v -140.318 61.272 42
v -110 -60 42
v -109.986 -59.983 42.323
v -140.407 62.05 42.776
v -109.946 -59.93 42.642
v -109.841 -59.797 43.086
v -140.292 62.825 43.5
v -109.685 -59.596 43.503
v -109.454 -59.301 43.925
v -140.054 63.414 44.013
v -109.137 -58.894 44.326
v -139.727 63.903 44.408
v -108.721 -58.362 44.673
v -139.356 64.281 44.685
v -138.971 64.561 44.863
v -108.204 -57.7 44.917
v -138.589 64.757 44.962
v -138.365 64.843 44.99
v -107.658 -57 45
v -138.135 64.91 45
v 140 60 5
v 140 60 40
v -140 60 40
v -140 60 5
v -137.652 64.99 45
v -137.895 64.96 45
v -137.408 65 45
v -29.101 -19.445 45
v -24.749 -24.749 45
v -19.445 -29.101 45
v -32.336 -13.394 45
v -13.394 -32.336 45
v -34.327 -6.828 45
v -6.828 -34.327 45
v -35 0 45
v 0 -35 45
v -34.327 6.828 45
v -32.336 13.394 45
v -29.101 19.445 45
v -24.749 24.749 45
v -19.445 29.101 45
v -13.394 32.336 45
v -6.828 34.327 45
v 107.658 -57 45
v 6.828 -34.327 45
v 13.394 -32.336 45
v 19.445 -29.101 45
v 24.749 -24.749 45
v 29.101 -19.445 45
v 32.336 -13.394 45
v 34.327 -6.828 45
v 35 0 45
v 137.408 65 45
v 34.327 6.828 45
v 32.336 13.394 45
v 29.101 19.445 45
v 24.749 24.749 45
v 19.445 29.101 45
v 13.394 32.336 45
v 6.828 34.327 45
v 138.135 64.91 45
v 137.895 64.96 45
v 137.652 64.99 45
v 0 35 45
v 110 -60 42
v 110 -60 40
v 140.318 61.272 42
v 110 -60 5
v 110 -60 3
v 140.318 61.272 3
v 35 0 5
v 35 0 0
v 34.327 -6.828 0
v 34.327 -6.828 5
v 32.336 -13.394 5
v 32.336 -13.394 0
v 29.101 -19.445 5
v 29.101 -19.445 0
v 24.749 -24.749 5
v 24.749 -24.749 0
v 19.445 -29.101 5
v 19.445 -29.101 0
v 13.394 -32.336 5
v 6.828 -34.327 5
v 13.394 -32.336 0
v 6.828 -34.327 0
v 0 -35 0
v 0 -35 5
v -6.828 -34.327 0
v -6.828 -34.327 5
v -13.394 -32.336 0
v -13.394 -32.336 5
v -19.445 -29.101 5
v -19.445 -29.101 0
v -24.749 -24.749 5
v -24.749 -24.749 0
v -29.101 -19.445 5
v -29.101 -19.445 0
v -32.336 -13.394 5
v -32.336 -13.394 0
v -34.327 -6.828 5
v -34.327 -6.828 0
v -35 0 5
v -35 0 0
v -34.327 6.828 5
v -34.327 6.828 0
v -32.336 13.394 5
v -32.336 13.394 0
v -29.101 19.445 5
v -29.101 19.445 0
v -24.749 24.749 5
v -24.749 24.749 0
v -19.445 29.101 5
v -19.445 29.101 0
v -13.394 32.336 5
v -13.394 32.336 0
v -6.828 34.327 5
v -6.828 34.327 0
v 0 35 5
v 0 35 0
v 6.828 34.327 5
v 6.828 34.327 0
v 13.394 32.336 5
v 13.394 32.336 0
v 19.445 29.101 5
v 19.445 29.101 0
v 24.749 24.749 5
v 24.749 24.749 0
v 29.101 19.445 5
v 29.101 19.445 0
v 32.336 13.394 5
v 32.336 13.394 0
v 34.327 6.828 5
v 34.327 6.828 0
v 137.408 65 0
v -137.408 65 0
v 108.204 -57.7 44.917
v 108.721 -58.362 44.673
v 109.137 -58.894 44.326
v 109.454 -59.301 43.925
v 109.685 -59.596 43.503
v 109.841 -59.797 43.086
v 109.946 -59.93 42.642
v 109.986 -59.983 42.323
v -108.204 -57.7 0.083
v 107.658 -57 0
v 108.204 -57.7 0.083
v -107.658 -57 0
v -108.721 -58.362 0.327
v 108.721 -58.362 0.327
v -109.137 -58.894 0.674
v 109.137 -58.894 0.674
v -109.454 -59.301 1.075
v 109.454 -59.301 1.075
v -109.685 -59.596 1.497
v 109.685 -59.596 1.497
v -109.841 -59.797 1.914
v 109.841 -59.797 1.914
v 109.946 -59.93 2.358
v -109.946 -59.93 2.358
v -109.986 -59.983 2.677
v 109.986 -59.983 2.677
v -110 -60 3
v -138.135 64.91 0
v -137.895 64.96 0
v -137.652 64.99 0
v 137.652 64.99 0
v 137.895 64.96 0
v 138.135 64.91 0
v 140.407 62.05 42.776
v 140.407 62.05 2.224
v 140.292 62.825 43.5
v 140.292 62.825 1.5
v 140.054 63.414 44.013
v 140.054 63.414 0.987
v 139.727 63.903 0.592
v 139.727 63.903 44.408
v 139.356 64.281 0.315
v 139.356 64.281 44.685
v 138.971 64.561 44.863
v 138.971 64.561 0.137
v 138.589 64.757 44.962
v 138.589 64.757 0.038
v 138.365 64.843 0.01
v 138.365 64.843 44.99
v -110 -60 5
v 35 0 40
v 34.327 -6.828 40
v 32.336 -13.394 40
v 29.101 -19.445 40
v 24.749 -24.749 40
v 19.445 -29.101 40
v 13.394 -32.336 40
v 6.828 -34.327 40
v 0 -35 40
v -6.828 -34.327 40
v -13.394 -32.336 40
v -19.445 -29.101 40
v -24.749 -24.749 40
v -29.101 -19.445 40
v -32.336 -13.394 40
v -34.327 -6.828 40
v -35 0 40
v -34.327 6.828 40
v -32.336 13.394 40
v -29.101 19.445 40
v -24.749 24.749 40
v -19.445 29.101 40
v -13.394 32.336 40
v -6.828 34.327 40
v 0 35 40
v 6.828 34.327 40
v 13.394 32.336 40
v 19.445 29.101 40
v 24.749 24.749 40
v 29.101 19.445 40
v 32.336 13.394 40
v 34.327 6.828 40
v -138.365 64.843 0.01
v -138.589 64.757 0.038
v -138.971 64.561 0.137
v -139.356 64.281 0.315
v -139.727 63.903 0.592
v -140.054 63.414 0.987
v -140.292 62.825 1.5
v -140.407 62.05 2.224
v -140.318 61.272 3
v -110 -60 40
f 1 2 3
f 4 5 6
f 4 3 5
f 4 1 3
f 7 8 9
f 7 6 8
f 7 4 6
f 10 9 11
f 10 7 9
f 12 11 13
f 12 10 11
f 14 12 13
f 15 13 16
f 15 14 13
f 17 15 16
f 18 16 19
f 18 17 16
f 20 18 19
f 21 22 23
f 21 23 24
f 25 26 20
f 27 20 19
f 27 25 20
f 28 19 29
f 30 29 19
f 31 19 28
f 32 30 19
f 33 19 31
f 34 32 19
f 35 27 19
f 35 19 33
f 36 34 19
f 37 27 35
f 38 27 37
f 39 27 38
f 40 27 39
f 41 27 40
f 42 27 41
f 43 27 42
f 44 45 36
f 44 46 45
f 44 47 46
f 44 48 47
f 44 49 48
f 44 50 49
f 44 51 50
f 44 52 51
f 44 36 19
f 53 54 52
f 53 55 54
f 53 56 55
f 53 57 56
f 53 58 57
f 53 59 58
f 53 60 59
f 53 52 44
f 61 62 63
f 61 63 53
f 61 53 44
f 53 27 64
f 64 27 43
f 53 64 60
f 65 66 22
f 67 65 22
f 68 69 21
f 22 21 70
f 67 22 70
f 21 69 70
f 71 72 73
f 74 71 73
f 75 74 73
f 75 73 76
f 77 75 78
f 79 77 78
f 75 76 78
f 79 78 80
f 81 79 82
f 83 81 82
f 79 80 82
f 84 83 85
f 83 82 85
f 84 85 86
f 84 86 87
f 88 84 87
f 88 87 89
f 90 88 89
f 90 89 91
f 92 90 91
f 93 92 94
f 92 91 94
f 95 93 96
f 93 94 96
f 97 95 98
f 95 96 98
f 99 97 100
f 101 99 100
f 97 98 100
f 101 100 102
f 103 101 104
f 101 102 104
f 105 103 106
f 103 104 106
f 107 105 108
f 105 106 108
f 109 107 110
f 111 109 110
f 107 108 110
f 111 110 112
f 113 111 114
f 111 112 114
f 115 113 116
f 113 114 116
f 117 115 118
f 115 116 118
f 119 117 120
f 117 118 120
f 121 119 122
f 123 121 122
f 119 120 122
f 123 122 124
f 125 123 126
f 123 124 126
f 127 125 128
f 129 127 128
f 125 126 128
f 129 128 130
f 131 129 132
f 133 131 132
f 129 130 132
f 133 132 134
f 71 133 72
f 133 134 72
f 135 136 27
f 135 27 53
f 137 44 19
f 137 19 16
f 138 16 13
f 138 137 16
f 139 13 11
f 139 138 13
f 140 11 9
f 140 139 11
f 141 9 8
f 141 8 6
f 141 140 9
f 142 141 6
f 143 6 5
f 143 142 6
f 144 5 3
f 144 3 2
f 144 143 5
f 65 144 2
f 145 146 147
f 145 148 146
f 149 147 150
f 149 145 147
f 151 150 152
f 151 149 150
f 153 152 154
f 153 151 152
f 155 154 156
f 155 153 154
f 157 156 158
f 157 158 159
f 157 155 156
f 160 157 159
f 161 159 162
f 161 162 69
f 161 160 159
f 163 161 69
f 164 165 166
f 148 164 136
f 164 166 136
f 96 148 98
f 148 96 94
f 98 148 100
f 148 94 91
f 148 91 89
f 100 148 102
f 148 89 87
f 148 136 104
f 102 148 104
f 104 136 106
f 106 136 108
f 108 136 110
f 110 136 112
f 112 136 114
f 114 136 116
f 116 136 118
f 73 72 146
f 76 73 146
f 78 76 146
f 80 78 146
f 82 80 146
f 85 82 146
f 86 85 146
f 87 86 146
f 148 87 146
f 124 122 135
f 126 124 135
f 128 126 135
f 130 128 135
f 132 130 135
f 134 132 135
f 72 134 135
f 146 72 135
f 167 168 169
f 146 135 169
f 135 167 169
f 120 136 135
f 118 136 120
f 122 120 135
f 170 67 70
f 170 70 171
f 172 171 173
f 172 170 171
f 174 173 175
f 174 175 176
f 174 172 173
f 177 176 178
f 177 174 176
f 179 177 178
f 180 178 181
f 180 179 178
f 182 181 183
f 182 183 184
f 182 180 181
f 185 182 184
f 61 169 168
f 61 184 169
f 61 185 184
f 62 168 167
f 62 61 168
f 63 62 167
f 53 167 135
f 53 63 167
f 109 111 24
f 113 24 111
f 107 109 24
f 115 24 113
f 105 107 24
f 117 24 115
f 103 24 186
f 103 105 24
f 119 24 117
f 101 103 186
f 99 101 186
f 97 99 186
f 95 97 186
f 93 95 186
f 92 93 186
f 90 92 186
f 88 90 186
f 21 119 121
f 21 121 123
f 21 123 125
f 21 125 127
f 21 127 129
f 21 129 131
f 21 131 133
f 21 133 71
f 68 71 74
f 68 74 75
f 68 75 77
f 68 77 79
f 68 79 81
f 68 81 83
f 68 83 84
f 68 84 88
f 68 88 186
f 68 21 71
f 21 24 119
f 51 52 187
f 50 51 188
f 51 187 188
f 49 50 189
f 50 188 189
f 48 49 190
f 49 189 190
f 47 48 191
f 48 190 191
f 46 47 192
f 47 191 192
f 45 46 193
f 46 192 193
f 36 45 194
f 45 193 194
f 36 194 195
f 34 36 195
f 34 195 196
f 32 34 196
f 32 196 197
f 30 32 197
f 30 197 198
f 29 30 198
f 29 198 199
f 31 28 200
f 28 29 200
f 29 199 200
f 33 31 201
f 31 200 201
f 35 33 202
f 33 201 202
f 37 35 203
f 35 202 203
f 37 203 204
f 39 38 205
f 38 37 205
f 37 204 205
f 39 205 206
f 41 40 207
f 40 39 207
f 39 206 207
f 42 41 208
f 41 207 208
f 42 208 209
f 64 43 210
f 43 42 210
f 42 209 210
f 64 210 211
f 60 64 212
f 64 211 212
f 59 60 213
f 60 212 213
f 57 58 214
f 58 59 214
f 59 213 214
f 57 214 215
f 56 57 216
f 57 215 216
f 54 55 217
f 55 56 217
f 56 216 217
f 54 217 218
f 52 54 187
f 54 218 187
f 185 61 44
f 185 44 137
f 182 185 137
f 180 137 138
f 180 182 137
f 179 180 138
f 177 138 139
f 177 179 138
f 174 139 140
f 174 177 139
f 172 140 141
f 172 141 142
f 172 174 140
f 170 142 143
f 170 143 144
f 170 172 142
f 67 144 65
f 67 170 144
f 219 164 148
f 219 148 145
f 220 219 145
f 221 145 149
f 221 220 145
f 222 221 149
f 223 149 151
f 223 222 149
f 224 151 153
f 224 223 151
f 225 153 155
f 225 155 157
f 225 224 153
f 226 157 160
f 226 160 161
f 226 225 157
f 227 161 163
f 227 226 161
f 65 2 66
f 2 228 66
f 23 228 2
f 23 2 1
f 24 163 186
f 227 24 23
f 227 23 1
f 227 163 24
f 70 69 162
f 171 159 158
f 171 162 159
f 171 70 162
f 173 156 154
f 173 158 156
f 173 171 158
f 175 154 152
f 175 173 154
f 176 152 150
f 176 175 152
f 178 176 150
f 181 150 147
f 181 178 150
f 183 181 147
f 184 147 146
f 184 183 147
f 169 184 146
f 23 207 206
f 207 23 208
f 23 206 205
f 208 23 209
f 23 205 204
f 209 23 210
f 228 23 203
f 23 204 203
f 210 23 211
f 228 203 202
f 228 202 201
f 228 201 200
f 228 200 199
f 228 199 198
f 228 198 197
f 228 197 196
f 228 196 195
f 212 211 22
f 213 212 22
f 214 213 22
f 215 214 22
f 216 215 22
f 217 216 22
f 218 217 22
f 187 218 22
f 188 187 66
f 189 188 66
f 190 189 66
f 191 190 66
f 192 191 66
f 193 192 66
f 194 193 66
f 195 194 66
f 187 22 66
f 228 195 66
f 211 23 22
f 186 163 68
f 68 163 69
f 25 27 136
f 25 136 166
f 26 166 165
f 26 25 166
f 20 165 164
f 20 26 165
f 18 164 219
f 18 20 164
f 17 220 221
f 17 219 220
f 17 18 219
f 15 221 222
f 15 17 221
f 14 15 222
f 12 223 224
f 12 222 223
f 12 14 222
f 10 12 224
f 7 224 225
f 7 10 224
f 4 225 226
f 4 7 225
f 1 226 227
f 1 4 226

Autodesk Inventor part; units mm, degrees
ref_plane "XZ Plane" through (0, 0, 0) normal (0, 1, 0) x (-1, 0, 0)
sketch "Sketch1" plane through (0, 0, 0) normal (0, 0, 1) x (1, 0, 0)
  circle A0 centre (0, 0) radius 35
  line L0 (0, 0) -> (0, 35)
  line L1 (0, 0) -> (0, -35)
  line L2 (110, -60) -> (141.25, 65)
  line L3 (-110, -60) -> (-141.25, 65)
  line L4 (0, -35) -> (0, -60)
  line L5 (0, -60) -> (110, -60)
  line L6 (0, -60) -> (-110, -60)
  line L7 (0, 35) -> (0, 65)
  line L8 (0, 65) -> (141.25, 65)
  line L9 (0, 65) -> (-141.25, 65)
extrude "Extrusion3" add sketch "Sketch1" along normal blind 45 contours A0 L7 L8 L2 L5 L4 | A0 L4 L6 L3 L9 L7
ref_plane "Work Plane2" through (142.5, 0, 0) normal (1, 0, 0) x (0, 1, 0)
fillet "Fillet2" radius 3 8 edges at (-141.25, 65, 22.5) (141.25, 65, 22.5) (125.625, 2.5, 45) (-125.625, 2.5, 45) (-125.625, 2.5, 0) (125.625, 2.5, 0) (0, -60, 0) (0, -60, 45)
sketch "Sketch5" plane through (142.5, 0, 0) normal (1, 0, 0) x (0, 1, 0)
  point P0 (0, 0)
ref_plane "Work Plane3" through (140, 0, 0) normal (1, 0, 0) x (0, 1, 0)
sketch "Sketch6" plane through (140, 0, 0) normal (1, 0, 0) x (0, 1, 0)
  line L0 (-56.5599, 40) -> (60, 40)
  line L1 (60, 40) -> (60, 5)
  line L2 (60, 5) -> (-60.1868, 5)
  line L3 (-56.5599, 40) -> (60, 5) construction
  line L4 (60, 40) -> (-60.1868, 5) construction
  line L5 (65, 0) -> (65, 45) projected
  line L6 (-56.5599, 40) -> (-64.3318, 40)
  line L7 (-64.3318, 40) -> (-64.3318, 5)
  line L8 (-64.3318, 5) -> (-60.1868, 5)
  line L9 (64.9104, 45) -> (-57, 45) projected
  line L10 (-57, 0) -> (64.9104, 0) projected
  point P0 (0, 0)
  point P1 (0.8272, 22.7681)
  dimension "d33" = 5
  dimension "d36" = 5
  dimension "d37" = 5
extrude "Extrusion5" cut sketch "Sketch6" against normal blind 1000
properties part number "sambungan leaf spring" material "Steel, Mild"
